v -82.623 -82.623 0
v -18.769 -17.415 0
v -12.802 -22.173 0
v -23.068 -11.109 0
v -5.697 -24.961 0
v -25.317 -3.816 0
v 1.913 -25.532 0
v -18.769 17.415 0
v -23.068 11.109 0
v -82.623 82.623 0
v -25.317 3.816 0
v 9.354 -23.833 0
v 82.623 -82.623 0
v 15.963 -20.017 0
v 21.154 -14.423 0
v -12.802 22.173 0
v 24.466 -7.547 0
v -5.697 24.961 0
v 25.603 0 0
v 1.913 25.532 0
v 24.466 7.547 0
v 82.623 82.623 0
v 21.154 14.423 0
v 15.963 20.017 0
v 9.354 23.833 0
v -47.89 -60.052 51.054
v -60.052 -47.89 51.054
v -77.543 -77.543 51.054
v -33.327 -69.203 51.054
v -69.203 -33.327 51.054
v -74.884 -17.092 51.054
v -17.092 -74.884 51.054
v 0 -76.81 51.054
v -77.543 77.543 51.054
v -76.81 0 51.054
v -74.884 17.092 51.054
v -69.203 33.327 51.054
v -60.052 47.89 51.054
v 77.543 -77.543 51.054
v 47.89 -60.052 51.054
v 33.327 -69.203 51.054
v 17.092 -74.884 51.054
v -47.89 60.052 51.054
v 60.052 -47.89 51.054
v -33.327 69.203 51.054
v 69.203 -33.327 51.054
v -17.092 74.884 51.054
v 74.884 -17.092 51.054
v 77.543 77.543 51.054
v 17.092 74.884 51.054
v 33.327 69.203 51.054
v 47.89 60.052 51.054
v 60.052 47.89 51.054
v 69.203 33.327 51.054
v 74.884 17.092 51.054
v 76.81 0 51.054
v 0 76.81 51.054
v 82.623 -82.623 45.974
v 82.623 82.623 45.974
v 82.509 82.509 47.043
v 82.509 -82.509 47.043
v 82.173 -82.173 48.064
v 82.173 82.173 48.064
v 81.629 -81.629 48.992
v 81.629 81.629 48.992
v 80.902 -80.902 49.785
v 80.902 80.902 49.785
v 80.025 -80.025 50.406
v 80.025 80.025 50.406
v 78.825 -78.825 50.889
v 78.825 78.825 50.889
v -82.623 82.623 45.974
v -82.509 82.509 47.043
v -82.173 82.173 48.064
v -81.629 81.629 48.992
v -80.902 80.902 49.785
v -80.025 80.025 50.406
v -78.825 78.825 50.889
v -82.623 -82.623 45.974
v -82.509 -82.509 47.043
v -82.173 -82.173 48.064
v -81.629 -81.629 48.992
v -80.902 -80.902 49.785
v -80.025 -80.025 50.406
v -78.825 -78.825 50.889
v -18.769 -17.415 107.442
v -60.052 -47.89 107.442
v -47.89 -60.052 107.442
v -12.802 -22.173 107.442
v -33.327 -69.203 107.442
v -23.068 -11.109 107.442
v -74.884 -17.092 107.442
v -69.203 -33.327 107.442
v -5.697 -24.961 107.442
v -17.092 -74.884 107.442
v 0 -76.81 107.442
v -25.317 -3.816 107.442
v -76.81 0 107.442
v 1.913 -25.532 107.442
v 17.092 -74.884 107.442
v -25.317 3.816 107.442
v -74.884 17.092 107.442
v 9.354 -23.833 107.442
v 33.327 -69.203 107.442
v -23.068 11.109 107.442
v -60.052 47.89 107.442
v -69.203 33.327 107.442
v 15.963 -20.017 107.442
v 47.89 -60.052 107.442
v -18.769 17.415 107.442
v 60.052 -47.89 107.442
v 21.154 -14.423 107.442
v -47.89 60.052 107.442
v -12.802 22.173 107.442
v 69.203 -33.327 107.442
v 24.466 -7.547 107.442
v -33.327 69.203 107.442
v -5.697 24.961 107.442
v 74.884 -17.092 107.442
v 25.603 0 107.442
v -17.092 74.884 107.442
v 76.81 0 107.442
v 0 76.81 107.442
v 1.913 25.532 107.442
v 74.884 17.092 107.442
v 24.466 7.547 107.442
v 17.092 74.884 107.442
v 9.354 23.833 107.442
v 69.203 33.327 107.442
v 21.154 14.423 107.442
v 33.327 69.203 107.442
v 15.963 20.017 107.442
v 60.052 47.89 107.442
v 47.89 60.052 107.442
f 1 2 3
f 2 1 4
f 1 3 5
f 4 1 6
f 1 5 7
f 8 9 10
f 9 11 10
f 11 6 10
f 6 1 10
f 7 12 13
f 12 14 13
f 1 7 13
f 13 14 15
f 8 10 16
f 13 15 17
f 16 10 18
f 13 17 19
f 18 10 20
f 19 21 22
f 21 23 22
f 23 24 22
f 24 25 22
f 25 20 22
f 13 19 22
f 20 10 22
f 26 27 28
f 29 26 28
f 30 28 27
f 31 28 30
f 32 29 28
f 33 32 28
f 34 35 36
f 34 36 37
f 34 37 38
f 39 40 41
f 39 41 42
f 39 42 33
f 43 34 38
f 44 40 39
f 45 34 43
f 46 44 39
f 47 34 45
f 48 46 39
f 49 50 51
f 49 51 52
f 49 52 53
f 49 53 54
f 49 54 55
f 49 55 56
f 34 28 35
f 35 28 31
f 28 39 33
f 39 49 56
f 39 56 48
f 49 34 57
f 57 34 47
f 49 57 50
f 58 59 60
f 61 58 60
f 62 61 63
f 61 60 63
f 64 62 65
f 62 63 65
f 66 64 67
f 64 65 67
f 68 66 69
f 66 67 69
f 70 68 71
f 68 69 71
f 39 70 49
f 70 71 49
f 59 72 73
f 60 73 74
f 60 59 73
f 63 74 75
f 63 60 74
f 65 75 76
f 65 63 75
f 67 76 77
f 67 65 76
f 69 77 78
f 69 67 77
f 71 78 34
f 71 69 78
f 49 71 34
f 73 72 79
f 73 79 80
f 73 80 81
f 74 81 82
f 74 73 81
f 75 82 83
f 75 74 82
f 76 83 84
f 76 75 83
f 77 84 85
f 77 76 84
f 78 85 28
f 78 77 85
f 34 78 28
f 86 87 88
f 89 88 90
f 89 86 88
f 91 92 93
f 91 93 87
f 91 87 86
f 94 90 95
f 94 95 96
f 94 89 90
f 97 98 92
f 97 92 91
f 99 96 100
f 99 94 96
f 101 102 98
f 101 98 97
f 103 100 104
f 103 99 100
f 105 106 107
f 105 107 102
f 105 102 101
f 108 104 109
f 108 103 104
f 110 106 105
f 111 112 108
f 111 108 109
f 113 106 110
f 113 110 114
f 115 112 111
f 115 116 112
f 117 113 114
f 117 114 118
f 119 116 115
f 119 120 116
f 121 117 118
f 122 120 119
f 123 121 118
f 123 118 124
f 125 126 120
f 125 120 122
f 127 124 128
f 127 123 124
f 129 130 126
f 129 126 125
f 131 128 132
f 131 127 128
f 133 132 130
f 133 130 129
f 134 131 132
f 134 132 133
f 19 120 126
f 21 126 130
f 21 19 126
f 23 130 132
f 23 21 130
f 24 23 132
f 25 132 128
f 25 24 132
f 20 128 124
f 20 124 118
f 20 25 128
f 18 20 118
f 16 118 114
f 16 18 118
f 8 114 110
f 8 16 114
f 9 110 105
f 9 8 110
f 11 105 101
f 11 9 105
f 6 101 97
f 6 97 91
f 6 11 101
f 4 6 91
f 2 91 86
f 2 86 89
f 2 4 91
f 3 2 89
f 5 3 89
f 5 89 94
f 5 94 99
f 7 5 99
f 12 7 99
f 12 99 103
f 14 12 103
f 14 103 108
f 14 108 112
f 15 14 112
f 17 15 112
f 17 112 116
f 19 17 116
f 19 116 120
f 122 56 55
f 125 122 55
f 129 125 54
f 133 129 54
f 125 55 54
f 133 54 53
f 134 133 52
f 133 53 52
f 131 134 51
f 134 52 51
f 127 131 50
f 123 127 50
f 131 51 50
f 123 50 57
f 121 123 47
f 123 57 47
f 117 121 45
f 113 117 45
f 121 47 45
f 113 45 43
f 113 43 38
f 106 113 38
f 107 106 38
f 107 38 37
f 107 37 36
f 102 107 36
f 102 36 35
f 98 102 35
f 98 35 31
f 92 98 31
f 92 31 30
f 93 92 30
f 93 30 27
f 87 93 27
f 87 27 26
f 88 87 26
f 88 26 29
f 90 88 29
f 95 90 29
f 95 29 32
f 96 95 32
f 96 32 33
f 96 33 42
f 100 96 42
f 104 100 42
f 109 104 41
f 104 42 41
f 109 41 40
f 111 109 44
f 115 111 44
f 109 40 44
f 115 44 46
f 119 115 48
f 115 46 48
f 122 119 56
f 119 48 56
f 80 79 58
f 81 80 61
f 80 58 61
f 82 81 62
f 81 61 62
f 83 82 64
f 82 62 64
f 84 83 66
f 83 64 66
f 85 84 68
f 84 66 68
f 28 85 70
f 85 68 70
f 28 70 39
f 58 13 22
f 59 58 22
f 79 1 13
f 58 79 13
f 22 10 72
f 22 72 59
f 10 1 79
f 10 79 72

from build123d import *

# Parameters (mm, degrees)
F0_W     = 165.245458
F0_H     = 165.245458
F0_R     = 25.603294
F2_DEPTH = 51.054
F3_R     = 5.08
F1_R     = 76.809882
F1_R_2   = 25.603294
F4_DEPTH = 107.442


with BuildPart() as f2:
    # F0 (on Top) → F2 (new body)
    with BuildSketch(Plane.XY):
        Rectangle(F0_W, F0_H)
        Circle(F0_R, mode=Mode.SUBTRACT)
    extrude(amount=F2_DEPTH)

    # F3
    f3_edges = [f2.edges().sort_by_distance(p)[0] for p in [
        (-82.622729, 0, 51.054),
        (0, -82.622729, 51.054),
        (82.622729, 0, 51.054),
        (0, 82.622729, 51.054),
    ]]
    fillet(f3_edges, radius=F3_R)

    # F1 (on face) → F4 (join)
    with BuildSketch(Plane.XY):
        Circle(F1_R)
        Circle(F1_R_2, mode=Mode.SUBTRACT)
    extrude(amount=F4_DEPTH)


solid = f2.part
